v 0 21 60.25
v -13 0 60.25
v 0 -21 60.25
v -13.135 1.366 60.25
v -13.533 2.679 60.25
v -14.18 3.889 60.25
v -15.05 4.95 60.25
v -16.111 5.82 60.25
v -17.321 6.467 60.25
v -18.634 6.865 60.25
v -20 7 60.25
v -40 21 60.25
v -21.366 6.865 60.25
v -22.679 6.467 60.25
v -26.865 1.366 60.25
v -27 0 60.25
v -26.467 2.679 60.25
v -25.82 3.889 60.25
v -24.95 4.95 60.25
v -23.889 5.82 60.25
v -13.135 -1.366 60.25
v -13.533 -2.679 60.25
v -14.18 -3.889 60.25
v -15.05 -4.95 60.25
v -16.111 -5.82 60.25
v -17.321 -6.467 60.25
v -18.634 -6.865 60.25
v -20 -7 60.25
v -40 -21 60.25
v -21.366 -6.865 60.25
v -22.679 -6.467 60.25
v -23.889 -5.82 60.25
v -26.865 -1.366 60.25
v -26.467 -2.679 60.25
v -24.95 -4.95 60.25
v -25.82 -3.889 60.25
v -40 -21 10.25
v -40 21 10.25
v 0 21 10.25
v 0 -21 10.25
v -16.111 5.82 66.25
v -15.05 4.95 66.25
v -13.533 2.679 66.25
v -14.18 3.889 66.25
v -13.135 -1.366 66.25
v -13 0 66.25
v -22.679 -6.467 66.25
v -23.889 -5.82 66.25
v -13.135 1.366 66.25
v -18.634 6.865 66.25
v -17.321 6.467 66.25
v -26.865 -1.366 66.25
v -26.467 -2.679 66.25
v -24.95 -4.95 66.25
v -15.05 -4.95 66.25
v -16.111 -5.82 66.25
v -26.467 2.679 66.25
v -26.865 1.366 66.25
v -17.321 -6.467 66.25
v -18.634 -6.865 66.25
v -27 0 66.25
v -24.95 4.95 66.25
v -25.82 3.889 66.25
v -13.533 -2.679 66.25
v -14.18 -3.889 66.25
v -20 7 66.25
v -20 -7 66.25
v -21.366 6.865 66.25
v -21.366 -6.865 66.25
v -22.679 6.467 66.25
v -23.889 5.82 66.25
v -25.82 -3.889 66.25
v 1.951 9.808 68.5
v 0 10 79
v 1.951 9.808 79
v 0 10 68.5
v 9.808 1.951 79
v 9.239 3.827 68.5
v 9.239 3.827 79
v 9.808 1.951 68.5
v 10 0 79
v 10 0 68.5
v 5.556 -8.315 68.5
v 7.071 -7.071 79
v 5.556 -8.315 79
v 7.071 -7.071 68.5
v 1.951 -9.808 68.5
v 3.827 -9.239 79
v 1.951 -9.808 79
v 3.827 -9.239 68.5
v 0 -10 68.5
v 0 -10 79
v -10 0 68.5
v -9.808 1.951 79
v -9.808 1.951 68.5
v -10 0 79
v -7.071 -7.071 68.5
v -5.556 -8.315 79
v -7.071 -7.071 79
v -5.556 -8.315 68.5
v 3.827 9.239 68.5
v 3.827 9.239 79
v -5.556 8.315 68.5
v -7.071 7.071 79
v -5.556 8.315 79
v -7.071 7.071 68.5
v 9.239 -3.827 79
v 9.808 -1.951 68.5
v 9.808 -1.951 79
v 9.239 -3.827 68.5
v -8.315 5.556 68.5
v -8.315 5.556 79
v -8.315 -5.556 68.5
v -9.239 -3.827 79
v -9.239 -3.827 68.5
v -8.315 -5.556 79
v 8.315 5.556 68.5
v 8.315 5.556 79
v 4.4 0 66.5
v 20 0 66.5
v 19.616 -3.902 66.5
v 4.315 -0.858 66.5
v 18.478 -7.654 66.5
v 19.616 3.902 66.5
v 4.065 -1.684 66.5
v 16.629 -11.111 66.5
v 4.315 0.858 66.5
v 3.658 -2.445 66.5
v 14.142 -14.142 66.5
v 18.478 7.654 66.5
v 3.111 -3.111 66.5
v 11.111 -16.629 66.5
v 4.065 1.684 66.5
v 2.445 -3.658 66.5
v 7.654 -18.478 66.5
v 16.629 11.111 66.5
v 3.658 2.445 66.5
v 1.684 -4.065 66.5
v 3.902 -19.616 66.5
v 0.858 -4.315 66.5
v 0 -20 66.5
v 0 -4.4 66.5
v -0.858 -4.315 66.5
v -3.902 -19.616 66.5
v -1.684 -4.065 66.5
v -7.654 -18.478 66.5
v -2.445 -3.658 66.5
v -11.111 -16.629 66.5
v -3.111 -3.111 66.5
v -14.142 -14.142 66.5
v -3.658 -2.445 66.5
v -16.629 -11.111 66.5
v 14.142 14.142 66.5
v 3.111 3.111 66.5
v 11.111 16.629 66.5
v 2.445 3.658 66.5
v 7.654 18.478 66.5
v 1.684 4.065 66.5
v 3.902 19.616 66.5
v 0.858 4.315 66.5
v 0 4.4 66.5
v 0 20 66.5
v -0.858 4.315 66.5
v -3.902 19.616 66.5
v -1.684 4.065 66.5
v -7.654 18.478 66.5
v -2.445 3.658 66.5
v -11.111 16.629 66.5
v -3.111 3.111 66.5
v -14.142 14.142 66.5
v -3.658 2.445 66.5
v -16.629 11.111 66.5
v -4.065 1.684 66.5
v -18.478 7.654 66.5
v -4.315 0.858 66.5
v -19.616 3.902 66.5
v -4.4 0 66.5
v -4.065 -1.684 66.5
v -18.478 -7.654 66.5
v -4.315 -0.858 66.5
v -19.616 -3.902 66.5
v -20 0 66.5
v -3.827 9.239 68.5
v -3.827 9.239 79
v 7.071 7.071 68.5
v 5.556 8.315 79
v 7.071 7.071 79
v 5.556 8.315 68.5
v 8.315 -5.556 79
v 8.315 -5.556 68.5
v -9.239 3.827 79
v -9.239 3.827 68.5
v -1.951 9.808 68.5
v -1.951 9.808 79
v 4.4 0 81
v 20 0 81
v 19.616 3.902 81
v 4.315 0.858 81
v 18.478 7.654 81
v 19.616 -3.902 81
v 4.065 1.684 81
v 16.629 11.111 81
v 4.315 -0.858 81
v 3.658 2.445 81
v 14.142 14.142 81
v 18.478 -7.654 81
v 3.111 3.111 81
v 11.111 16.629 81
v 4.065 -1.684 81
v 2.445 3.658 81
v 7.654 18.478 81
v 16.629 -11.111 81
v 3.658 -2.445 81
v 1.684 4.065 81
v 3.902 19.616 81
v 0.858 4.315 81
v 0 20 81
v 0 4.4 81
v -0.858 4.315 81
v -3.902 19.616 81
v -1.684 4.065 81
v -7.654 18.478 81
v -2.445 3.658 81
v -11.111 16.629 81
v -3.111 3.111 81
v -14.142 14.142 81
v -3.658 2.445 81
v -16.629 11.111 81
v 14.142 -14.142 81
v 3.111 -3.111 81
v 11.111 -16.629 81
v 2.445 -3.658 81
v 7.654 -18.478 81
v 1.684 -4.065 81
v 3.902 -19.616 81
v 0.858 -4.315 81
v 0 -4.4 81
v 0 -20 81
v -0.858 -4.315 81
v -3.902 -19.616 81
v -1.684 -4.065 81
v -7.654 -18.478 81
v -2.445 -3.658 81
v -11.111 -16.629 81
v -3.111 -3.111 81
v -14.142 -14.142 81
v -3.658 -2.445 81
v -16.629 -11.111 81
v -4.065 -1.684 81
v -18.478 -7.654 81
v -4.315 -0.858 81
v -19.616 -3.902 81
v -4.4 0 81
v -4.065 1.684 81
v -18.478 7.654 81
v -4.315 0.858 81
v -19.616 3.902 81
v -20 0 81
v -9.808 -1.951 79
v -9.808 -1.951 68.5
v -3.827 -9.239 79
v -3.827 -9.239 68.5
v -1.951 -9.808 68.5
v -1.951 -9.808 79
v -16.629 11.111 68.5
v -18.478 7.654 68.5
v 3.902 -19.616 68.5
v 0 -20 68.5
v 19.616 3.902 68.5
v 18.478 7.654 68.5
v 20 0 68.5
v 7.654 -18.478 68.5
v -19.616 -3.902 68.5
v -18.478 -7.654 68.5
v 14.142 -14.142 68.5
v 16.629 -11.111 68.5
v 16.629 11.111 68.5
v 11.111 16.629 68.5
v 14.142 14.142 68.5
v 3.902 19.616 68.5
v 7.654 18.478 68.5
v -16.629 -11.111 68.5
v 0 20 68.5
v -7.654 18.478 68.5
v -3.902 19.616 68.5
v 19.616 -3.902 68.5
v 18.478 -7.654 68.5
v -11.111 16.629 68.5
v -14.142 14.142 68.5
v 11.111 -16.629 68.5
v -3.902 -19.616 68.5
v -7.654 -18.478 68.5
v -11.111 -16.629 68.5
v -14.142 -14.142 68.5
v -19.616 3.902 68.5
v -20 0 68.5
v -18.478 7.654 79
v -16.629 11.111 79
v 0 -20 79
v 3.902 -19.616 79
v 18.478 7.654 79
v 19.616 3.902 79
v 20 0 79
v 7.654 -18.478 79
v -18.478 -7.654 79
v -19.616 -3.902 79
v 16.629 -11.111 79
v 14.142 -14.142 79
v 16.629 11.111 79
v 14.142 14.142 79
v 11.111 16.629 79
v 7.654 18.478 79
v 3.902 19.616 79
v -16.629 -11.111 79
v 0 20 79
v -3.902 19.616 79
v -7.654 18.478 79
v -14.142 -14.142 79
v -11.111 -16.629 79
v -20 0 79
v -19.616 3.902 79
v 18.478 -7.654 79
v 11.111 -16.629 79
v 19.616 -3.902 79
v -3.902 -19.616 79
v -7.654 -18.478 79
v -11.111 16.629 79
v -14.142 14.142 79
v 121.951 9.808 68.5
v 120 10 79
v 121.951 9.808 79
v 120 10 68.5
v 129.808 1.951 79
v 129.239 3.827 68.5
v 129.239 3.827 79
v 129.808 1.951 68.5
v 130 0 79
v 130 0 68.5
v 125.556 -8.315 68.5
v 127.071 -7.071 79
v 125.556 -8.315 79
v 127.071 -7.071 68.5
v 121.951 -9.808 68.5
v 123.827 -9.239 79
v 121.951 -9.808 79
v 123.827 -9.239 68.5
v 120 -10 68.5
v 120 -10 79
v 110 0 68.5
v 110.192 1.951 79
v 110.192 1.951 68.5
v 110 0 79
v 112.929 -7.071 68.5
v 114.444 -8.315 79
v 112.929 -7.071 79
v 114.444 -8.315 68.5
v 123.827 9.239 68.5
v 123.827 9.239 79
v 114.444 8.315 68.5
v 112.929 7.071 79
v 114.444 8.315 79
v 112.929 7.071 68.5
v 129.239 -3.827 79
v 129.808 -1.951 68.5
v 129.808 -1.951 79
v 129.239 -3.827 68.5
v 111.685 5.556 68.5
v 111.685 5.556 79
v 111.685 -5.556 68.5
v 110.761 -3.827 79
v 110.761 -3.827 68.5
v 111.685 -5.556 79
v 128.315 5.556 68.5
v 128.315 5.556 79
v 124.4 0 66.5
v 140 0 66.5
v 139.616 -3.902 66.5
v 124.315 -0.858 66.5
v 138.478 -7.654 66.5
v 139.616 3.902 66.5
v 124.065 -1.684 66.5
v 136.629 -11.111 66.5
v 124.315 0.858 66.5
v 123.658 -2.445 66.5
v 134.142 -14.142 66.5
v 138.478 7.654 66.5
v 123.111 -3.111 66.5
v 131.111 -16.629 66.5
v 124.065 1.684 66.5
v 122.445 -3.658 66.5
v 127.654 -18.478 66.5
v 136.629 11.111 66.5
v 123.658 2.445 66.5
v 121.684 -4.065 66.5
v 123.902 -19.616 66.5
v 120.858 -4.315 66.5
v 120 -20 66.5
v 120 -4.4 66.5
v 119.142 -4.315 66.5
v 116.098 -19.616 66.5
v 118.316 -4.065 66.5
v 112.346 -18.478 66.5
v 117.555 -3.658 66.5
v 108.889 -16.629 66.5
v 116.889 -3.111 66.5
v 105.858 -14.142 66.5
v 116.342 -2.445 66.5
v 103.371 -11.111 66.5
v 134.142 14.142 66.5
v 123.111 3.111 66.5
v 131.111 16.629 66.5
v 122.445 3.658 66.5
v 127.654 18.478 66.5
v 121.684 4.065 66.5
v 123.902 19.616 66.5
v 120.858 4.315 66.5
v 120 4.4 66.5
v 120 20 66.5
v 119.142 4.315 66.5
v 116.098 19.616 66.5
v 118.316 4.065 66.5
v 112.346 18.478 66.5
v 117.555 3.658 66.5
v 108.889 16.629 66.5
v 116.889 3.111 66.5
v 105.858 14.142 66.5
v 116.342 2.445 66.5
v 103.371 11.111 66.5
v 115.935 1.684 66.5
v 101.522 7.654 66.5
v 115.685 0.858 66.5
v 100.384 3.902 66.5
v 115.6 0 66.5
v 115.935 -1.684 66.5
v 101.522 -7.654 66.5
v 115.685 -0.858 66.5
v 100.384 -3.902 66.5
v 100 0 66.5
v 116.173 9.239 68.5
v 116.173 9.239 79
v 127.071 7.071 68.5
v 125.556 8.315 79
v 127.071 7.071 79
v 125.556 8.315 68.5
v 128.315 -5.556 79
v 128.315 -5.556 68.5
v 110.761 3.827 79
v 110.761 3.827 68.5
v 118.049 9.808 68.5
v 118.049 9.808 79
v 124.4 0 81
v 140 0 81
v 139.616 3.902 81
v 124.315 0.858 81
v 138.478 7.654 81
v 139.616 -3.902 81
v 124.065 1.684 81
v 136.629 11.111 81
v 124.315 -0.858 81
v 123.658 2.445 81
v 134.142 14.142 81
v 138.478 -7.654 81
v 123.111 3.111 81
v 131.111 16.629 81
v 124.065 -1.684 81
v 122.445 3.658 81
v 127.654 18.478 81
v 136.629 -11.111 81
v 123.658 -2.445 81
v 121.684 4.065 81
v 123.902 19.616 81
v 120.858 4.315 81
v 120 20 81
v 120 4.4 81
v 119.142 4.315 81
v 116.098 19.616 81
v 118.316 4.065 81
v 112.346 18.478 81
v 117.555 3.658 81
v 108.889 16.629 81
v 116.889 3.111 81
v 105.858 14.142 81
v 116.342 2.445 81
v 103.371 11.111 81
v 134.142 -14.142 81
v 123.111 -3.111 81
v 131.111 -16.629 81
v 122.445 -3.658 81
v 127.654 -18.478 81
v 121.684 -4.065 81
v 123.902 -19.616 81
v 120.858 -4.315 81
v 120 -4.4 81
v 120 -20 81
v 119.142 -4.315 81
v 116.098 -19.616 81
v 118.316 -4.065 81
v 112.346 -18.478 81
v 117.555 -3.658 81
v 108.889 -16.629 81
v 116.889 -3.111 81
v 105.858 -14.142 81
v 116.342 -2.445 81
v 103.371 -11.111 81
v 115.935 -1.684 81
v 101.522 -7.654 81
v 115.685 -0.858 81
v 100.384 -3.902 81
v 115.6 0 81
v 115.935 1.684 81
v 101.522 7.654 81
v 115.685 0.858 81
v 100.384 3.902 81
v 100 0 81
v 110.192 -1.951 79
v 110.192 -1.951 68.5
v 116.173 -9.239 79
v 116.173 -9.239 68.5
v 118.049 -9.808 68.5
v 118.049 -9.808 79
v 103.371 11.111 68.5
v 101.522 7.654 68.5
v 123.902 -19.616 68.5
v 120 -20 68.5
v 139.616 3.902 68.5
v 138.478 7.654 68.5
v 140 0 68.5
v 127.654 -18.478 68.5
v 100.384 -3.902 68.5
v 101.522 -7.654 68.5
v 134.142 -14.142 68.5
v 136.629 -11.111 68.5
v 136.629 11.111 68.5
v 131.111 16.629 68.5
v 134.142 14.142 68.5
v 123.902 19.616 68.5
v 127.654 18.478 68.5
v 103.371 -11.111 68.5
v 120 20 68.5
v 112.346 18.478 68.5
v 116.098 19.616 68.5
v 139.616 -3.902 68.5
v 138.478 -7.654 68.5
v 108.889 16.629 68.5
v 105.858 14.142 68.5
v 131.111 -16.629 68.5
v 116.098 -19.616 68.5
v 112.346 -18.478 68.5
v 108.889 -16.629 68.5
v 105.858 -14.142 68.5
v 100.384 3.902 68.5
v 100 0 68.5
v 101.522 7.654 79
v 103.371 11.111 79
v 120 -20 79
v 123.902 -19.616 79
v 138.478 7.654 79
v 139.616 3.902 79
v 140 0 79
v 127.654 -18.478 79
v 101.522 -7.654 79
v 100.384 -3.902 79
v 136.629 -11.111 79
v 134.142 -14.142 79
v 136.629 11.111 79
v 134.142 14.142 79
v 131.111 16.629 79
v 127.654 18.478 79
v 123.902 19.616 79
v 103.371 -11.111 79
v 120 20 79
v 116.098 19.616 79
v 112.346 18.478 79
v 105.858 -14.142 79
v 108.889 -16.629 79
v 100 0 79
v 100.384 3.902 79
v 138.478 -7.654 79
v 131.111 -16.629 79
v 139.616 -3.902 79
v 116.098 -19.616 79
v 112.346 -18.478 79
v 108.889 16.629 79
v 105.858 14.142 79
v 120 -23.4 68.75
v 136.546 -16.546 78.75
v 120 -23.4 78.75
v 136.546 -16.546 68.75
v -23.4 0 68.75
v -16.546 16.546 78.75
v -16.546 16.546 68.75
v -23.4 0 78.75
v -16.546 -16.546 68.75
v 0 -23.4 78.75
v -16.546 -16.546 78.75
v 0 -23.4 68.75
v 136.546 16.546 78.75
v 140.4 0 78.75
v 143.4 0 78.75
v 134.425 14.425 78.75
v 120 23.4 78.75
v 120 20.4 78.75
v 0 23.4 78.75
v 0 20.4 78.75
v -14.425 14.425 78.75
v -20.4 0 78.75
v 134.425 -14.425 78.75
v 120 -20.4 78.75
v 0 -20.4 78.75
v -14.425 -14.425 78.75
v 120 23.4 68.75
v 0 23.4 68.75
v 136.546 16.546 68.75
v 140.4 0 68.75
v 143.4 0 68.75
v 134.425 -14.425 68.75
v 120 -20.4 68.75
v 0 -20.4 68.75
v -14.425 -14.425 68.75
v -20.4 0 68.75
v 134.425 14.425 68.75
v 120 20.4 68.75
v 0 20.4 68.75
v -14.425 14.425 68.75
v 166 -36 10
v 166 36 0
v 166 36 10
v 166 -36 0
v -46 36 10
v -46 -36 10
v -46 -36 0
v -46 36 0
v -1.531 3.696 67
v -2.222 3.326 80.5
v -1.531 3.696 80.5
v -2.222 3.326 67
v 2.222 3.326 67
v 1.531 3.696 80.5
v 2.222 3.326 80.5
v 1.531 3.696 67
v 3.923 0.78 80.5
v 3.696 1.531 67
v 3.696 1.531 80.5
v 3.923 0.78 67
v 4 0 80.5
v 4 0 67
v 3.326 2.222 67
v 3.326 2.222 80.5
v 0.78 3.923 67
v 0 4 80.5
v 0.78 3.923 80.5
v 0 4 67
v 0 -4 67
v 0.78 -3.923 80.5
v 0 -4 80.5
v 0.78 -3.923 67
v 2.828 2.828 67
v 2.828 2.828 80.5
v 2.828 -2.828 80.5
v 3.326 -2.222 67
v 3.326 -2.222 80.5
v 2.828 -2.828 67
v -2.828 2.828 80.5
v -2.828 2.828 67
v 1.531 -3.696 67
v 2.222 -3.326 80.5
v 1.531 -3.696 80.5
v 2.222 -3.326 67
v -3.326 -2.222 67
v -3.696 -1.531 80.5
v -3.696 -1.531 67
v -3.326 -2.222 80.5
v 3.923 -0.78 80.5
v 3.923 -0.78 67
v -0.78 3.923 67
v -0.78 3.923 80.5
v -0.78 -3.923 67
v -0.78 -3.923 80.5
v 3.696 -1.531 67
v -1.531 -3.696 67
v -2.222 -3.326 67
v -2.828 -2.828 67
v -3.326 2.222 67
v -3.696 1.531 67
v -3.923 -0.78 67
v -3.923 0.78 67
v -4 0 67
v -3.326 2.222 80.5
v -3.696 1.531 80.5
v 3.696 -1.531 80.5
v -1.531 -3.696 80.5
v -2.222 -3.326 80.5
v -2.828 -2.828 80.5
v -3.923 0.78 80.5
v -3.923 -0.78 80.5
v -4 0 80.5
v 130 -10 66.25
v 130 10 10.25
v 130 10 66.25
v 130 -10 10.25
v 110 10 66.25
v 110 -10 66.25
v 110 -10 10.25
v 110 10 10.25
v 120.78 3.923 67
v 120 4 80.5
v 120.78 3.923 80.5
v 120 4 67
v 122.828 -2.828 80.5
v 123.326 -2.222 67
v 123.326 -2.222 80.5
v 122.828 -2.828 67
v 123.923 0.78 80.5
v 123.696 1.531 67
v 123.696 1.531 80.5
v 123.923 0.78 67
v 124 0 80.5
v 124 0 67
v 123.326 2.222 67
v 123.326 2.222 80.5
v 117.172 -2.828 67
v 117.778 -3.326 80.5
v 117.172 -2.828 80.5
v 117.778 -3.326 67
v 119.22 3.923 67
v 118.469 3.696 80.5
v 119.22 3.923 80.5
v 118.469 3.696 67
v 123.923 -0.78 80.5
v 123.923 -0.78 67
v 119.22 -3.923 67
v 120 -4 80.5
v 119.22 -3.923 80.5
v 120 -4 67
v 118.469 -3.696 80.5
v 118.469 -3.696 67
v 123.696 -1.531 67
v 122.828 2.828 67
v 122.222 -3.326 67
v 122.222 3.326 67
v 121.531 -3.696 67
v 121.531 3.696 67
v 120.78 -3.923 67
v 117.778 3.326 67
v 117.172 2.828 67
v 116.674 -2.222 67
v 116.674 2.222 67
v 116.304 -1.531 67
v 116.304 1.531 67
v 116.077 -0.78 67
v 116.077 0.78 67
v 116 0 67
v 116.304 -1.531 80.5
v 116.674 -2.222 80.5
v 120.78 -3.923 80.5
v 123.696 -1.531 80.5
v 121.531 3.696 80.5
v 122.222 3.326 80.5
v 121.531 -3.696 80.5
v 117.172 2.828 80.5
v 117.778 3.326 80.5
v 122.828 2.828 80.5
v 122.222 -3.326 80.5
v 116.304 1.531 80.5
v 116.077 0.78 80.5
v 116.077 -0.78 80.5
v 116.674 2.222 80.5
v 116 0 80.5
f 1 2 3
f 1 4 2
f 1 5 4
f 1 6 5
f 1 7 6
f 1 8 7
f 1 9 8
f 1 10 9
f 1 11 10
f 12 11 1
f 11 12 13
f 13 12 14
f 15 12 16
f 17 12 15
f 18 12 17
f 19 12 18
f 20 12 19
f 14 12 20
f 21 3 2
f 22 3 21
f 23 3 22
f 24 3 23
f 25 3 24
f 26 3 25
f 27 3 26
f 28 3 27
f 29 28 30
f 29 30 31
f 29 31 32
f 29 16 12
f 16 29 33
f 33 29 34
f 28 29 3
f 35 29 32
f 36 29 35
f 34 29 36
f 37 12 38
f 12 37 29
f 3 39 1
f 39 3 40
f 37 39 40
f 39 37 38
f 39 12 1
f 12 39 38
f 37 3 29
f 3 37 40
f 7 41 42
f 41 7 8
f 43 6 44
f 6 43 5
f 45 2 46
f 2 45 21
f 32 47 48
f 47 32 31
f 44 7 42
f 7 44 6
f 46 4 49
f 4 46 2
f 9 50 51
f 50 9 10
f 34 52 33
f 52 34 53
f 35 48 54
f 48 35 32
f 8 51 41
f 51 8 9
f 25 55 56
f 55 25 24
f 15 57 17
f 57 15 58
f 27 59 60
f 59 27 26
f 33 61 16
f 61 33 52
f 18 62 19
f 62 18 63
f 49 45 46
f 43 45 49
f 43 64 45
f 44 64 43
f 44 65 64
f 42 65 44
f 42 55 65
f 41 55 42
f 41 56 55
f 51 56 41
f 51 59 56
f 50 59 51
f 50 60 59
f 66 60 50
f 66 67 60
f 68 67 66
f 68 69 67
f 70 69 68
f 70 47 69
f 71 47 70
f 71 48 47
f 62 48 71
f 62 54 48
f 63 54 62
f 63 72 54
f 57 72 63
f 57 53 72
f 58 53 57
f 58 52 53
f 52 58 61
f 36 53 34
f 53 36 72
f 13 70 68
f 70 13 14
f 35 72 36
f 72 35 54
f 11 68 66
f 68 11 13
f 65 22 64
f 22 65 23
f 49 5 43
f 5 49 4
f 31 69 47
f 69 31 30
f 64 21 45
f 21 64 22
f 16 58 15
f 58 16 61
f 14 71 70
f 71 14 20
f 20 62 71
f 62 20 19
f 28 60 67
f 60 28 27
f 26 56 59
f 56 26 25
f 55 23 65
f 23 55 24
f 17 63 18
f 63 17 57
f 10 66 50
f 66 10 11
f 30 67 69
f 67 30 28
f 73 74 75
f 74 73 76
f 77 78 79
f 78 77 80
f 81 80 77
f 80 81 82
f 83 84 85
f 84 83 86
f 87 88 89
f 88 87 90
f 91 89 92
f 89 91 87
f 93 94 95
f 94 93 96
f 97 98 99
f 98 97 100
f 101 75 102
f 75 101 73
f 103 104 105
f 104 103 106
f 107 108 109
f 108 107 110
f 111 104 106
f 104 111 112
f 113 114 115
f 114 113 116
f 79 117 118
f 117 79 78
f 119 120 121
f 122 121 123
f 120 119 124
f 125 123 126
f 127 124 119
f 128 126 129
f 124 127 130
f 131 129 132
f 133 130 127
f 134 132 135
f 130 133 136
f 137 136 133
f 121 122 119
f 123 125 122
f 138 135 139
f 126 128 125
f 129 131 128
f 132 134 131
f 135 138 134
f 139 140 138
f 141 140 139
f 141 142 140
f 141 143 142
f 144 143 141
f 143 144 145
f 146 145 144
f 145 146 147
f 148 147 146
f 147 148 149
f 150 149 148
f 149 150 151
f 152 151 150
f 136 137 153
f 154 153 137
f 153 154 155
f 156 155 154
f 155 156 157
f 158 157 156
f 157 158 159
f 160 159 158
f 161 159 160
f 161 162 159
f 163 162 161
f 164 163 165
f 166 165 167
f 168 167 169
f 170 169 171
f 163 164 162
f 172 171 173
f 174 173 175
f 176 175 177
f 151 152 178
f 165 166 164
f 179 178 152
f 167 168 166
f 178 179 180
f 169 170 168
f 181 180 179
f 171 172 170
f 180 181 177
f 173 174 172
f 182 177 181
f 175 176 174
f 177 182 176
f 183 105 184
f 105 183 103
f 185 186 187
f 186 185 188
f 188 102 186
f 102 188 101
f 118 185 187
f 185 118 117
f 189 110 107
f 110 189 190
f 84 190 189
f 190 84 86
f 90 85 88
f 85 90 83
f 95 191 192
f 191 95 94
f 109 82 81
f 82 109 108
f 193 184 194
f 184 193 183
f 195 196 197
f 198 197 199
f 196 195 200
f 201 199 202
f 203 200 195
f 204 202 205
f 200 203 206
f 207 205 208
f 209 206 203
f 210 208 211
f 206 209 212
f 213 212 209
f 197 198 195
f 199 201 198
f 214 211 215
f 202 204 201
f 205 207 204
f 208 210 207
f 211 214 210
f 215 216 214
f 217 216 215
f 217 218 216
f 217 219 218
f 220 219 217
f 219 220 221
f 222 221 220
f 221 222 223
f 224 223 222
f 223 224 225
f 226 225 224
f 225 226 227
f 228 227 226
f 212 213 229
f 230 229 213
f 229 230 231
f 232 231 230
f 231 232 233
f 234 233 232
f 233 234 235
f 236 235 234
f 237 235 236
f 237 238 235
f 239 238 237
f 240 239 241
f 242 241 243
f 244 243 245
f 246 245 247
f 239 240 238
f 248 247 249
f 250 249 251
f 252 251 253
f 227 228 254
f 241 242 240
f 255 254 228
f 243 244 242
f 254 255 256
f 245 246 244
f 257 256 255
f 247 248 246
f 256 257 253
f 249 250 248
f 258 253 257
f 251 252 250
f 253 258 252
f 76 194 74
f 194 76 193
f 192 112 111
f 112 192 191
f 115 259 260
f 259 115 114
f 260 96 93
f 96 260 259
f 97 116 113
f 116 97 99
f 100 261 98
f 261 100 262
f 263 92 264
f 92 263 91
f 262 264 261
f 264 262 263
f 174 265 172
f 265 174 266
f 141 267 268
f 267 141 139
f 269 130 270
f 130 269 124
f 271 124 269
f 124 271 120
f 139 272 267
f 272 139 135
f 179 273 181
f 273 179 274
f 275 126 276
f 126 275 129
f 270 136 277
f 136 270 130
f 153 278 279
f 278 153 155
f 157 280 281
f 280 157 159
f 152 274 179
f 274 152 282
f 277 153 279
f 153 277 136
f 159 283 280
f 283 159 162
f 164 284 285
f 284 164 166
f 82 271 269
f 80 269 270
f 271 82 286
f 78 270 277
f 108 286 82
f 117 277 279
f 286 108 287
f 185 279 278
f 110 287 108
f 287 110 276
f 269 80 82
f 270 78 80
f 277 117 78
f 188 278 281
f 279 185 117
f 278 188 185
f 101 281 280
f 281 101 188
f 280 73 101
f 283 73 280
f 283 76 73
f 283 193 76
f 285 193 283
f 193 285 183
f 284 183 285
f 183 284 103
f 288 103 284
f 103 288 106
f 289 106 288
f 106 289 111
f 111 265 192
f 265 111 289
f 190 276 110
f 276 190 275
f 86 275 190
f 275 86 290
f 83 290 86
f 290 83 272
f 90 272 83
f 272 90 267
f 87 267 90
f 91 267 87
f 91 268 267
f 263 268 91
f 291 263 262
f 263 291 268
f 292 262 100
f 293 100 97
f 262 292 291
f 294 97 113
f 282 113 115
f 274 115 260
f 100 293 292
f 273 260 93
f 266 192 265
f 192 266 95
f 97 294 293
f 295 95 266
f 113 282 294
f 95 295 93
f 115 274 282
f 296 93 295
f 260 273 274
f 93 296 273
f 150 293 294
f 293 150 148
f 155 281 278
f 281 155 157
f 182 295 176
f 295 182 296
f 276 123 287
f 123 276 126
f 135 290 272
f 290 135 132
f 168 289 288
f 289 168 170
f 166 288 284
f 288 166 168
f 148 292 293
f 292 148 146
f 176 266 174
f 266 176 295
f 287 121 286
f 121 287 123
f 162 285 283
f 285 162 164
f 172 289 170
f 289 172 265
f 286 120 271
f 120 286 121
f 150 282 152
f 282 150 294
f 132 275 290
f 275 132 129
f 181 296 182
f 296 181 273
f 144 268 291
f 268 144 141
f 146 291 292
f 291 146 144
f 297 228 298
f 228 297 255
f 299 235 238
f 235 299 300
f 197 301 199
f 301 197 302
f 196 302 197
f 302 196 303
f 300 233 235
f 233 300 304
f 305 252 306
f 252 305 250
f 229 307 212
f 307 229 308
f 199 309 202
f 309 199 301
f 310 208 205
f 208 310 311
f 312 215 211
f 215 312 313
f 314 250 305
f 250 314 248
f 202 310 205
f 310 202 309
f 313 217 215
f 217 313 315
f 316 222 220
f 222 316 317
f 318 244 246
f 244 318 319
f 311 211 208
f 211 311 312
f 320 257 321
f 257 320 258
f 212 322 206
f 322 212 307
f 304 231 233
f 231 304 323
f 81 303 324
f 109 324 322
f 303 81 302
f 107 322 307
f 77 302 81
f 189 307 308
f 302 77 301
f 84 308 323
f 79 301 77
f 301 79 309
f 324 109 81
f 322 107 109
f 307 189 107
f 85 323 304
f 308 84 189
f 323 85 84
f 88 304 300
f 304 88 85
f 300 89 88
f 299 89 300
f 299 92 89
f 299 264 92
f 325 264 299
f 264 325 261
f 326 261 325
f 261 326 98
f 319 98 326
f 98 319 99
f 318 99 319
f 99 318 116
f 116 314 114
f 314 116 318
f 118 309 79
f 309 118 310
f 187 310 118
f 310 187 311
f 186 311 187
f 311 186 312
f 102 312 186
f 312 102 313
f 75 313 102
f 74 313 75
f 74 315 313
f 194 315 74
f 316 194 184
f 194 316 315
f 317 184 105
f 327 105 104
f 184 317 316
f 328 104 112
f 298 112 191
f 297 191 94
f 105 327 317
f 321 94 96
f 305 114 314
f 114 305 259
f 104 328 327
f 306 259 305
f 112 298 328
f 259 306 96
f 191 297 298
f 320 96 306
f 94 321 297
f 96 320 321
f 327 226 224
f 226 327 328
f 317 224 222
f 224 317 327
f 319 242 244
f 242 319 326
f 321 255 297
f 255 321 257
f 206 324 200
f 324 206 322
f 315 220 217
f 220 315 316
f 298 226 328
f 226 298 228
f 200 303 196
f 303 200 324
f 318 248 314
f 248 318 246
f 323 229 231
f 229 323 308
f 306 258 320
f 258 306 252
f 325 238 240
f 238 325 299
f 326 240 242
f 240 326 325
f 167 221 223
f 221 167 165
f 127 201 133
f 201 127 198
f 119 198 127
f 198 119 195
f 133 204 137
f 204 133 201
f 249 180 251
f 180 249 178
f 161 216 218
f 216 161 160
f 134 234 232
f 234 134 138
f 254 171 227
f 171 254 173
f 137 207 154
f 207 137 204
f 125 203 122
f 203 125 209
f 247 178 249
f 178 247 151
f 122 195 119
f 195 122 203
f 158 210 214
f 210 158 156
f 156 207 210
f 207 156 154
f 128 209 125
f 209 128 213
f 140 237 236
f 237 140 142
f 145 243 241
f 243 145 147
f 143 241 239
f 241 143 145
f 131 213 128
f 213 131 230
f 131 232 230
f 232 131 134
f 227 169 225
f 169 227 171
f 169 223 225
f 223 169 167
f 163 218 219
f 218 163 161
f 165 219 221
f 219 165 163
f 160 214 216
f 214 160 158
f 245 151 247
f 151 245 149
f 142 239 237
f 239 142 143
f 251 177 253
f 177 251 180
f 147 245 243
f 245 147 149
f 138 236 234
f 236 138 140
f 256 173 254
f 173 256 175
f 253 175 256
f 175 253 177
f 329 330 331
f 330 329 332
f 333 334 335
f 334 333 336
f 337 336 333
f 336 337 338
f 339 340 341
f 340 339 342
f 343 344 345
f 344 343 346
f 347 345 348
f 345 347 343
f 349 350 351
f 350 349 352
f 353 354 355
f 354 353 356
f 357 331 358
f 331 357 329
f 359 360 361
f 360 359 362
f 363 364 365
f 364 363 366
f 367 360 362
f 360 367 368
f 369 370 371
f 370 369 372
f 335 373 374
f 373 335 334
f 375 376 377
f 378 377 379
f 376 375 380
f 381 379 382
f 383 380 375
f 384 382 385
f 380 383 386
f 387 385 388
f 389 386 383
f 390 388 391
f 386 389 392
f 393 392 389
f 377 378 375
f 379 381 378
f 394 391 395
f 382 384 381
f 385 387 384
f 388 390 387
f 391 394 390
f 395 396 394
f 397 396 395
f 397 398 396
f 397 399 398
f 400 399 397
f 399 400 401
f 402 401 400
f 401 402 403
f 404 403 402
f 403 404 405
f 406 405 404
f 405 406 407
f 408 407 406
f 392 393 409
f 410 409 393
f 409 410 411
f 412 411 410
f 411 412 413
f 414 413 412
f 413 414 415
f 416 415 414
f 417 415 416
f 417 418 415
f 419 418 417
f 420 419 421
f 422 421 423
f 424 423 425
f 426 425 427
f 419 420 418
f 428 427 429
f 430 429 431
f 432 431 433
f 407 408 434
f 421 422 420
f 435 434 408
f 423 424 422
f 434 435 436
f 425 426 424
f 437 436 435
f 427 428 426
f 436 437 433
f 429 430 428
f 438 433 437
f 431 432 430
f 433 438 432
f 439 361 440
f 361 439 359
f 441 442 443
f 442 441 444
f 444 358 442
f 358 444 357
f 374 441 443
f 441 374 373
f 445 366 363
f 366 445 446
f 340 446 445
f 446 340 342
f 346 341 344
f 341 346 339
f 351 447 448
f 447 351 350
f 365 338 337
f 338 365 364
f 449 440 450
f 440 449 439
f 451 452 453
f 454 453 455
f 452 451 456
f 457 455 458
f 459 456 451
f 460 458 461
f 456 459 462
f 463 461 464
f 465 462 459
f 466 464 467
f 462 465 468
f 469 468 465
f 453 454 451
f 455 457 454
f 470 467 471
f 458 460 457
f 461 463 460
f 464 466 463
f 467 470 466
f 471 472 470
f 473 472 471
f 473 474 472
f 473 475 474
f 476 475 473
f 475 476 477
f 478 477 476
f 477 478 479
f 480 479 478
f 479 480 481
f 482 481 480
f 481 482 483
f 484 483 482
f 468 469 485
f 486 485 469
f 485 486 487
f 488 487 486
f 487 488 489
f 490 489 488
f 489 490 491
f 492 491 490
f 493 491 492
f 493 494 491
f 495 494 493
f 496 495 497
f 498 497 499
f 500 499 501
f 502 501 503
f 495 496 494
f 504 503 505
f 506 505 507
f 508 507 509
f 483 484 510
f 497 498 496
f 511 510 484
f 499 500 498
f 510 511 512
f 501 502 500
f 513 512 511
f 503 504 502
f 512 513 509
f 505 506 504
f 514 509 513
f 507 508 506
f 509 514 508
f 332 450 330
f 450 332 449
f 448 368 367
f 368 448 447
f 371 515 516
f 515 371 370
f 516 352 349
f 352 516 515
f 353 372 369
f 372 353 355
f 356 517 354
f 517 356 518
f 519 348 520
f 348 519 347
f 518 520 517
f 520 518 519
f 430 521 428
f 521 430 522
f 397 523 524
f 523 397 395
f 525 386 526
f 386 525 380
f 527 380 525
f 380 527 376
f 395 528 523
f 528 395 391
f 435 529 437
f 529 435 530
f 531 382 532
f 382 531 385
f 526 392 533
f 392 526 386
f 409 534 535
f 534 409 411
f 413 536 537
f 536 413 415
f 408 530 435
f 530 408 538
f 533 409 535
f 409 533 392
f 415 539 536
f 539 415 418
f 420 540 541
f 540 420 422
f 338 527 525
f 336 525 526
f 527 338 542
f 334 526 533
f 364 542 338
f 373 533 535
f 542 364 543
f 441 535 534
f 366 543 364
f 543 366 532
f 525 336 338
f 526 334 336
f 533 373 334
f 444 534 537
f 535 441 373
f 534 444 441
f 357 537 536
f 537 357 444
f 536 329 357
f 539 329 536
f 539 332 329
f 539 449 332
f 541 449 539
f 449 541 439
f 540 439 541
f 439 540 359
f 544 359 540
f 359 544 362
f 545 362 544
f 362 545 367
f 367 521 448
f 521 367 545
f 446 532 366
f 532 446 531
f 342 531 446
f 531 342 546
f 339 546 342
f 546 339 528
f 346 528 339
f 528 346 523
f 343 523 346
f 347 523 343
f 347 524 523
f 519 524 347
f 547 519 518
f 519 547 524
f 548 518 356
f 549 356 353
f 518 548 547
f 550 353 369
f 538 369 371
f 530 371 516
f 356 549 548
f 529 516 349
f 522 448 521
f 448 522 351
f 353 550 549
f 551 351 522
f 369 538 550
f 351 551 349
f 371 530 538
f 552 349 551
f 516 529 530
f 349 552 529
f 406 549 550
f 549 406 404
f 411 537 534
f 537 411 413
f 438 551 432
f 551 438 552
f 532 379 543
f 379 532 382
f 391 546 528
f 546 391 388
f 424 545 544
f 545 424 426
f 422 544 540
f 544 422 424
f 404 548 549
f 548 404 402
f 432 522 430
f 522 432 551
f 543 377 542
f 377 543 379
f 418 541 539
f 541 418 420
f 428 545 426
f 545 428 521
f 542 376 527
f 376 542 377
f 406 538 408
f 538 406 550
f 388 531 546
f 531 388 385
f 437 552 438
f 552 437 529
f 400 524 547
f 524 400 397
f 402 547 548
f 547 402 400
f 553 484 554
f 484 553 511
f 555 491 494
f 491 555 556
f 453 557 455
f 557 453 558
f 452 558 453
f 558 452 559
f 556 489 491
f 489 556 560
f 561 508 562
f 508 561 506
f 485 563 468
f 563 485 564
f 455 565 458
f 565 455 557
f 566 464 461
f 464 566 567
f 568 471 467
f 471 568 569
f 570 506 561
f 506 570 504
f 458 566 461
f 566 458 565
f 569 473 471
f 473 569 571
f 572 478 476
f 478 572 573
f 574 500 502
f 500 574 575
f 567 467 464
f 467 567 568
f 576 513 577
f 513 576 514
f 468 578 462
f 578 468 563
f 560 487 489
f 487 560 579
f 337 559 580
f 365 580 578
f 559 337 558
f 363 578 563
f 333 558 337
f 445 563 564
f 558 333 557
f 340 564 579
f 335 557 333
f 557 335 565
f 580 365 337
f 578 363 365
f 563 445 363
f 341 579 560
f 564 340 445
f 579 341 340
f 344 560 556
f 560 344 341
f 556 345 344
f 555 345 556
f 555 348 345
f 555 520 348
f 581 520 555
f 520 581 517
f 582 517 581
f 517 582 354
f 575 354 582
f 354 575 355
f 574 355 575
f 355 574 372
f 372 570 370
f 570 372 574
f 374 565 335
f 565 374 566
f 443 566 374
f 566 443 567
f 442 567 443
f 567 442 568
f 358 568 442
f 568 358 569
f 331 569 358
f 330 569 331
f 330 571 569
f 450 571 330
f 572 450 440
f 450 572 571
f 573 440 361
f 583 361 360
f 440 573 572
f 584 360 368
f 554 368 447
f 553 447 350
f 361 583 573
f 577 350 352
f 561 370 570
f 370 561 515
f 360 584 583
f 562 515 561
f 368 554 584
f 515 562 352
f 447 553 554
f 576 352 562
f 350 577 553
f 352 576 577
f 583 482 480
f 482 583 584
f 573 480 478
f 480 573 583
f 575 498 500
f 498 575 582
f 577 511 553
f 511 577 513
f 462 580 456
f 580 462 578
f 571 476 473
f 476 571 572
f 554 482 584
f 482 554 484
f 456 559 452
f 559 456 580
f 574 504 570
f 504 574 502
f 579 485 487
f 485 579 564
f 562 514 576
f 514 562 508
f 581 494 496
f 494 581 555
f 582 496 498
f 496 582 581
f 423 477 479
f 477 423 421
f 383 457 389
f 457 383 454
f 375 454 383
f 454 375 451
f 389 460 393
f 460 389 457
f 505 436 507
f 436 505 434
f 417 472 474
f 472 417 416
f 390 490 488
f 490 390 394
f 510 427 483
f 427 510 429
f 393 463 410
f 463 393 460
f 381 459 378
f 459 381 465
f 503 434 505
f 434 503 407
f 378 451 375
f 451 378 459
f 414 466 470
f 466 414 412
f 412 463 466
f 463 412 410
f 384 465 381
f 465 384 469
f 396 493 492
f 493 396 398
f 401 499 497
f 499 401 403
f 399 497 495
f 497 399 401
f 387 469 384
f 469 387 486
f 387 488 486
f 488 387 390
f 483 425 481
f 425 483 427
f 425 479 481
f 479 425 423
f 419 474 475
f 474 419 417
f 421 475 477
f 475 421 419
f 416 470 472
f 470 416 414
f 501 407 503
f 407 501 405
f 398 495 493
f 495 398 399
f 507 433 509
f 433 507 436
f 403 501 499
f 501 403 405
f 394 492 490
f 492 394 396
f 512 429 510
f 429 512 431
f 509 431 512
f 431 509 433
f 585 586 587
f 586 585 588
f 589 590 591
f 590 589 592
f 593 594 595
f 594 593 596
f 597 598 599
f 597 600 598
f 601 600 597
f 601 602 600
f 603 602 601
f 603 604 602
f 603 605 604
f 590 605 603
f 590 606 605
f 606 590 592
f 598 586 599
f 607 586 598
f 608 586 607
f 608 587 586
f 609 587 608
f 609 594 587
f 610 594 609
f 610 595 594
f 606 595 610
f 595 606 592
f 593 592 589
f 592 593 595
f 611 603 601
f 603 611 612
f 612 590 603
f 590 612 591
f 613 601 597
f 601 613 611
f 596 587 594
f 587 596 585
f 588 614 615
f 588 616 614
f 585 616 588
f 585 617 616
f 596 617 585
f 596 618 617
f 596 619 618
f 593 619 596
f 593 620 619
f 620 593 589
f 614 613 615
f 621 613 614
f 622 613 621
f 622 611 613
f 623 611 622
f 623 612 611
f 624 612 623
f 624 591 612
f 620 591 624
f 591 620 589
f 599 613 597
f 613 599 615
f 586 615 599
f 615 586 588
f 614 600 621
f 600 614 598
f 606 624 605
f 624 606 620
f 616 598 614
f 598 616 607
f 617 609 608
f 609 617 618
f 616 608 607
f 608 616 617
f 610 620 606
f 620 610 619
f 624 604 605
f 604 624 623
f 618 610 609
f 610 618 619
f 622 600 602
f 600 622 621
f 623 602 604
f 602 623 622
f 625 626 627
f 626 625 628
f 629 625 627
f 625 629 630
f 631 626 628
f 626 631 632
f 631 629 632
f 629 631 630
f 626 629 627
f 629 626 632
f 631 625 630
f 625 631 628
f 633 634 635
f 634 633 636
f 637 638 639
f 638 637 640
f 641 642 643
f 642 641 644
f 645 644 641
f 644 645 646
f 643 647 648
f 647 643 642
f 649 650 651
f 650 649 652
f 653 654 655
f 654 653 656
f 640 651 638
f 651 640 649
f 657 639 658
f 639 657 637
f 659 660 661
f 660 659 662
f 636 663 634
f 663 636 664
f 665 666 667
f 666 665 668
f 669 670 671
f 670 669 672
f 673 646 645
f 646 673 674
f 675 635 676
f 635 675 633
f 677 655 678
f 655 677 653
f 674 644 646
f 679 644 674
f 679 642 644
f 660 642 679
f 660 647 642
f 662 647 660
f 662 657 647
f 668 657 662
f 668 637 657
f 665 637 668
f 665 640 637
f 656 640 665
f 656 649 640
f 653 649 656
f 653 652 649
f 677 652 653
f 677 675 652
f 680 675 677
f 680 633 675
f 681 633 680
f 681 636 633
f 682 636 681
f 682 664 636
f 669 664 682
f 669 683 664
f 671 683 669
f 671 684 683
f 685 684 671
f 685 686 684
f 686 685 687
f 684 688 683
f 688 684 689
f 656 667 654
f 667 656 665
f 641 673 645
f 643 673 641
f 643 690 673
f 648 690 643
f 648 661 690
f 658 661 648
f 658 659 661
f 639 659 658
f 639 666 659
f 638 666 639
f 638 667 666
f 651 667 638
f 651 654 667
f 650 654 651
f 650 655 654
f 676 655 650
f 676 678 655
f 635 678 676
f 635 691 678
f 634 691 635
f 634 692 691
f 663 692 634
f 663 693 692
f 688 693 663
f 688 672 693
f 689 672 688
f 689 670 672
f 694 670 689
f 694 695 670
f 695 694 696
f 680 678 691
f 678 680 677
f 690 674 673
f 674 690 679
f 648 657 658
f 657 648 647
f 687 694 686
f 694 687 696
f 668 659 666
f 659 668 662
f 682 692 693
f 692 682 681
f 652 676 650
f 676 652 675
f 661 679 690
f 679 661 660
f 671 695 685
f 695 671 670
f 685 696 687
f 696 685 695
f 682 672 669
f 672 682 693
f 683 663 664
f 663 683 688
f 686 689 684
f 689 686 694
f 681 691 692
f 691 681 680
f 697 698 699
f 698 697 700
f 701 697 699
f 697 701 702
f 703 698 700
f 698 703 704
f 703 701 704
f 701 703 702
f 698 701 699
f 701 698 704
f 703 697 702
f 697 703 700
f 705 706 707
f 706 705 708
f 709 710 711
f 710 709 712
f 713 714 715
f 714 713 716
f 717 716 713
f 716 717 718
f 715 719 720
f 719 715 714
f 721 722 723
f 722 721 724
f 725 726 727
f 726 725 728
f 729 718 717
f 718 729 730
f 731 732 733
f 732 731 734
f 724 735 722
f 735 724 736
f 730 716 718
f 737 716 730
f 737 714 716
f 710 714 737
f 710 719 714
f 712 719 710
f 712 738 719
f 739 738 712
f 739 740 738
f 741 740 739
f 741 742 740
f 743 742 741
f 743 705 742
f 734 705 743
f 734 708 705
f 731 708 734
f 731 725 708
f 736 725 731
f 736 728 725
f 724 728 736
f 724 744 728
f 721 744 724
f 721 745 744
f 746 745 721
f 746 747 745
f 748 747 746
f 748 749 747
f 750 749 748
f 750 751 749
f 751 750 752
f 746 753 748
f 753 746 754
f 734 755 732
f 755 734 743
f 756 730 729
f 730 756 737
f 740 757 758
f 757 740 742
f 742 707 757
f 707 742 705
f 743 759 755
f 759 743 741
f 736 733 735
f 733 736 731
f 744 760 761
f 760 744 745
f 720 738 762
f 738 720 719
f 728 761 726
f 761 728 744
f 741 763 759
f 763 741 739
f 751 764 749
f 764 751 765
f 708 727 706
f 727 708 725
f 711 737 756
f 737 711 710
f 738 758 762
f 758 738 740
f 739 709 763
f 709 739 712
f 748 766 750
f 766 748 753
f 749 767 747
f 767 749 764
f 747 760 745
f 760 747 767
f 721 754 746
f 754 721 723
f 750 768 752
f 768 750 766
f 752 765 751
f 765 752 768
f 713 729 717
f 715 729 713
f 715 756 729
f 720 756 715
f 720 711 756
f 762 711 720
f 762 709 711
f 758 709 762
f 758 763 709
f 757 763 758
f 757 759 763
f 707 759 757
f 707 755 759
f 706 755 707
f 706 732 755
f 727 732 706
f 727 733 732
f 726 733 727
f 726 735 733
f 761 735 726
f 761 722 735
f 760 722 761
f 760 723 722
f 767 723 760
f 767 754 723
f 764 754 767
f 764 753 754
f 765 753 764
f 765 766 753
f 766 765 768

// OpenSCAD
$fn = 32;

// ------------------------------------------------------------------------
// Motor belt drive: span 120 mm, pulleys d40, belt 10 mm wide
// Every part is its own module, assembly() places every instance.
// ------------------------------------------------------------------------

// --- part 1 ---
module base_plate() {
  difference() {
    translate([-106, -36, 0]) cube([212, 72, 10]);
  }
}

// --- part 2 ---
module motor() {
  union() {
    translate([-25, -21, 0]) cube([50, 42, 40]);
    translate([28, 0, 20]) rotate([0, 90, 0]) cylinder(h = 6, d = 14, center = true);
  }
}

// --- part 3 ---
module drive_shaft() {
  translate([0, 0, -6.75]) cylinder(h = 13.5, d = 8);
}

// --- part 4 ---
module pulley_drive() {
  difference() {
    union() {
      cylinder(h = 14.5, d = 20);
      cylinder(h = 2, d = 40);
      translate([0, 0, 12.5]) cylinder(h = 2, d = 40);
    }
    translate([0, 0, -1]) cylinder(h = 16.5, d = 8.8);
  }
}

// --- part 5 ---
module idler_post() {
  translate([-10, -10, 0]) cube([20, 20, 56]);
}

// --- part 6 ---
module driven_shaft() {
  translate([0, 0, -6.75]) cylinder(h = 13.5, d = 8);
}

// --- part 7 ---
module pulley_driven() {
  difference() {
    union() {
      cylinder(h = 14.5, d = 20);
      cylinder(h = 2, d = 40);
      translate([0, 0, 12.5]) cylinder(h = 2, d = 40);
    }
    translate([0, 0, -1]) cylinder(h = 16.5, d = 8.8);
  }
}

// --- part 8 ---
module drive_belt() {
  difference() {
    linear_extrude(height = 10) polygon(points = concat([for (a = [90 : 45 : 270]) [23.4 * cos(a), 23.4 * sin(a)]], [for (a = [270 : 45 : 450]) [120 + 23.4 * cos(a), 23.4 * sin(a)]]));
    translate([0, 0, -1]) linear_extrude(height = 12) polygon(points = concat([for (a = [90 : 45 : 270]) [20.4 * cos(a), 20.4 * sin(a)]], [for (a = [270 : 45 : 450]) [120 + 20.4 * cos(a), 20.4 * sin(a)]]));
  }
}

// --- assembly ---
module assembly() {
  color([0.80, 0.24, 0.20]) translate([60, 0, 0]) rotate([0, 0, 0]) base_plate();
  color([0.20, 0.45, 0.75]) translate([0, 0, 35.25]) rotate([0, 270, 0]) motor();
  color([0.25, 0.62, 0.32]) translate([0, 0, 73.75]) rotate([0, 0, 0]) drive_shaft();
  color([0.92, 0.70, 0.18]) translate([0, 0, 66.5]) rotate([0, 0, 0]) pulley_drive();
  color([0.58, 0.35, 0.70]) translate([120, 0, 10.25]) rotate([0, 0, 0]) idler_post();
  color([0.16, 0.66, 0.66]) translate([120, 0, 73.75]) rotate([0, 0, 0]) driven_shaft();
  color([0.85, 0.48, 0.18]) translate([120, 0, 66.5]) rotate([0, 0, 0]) pulley_driven();
  color([0.55, 0.60, 0.65]) translate([0, 0, 68.75]) rotate([0, 0, 0]) drive_belt();
}

assembly();
